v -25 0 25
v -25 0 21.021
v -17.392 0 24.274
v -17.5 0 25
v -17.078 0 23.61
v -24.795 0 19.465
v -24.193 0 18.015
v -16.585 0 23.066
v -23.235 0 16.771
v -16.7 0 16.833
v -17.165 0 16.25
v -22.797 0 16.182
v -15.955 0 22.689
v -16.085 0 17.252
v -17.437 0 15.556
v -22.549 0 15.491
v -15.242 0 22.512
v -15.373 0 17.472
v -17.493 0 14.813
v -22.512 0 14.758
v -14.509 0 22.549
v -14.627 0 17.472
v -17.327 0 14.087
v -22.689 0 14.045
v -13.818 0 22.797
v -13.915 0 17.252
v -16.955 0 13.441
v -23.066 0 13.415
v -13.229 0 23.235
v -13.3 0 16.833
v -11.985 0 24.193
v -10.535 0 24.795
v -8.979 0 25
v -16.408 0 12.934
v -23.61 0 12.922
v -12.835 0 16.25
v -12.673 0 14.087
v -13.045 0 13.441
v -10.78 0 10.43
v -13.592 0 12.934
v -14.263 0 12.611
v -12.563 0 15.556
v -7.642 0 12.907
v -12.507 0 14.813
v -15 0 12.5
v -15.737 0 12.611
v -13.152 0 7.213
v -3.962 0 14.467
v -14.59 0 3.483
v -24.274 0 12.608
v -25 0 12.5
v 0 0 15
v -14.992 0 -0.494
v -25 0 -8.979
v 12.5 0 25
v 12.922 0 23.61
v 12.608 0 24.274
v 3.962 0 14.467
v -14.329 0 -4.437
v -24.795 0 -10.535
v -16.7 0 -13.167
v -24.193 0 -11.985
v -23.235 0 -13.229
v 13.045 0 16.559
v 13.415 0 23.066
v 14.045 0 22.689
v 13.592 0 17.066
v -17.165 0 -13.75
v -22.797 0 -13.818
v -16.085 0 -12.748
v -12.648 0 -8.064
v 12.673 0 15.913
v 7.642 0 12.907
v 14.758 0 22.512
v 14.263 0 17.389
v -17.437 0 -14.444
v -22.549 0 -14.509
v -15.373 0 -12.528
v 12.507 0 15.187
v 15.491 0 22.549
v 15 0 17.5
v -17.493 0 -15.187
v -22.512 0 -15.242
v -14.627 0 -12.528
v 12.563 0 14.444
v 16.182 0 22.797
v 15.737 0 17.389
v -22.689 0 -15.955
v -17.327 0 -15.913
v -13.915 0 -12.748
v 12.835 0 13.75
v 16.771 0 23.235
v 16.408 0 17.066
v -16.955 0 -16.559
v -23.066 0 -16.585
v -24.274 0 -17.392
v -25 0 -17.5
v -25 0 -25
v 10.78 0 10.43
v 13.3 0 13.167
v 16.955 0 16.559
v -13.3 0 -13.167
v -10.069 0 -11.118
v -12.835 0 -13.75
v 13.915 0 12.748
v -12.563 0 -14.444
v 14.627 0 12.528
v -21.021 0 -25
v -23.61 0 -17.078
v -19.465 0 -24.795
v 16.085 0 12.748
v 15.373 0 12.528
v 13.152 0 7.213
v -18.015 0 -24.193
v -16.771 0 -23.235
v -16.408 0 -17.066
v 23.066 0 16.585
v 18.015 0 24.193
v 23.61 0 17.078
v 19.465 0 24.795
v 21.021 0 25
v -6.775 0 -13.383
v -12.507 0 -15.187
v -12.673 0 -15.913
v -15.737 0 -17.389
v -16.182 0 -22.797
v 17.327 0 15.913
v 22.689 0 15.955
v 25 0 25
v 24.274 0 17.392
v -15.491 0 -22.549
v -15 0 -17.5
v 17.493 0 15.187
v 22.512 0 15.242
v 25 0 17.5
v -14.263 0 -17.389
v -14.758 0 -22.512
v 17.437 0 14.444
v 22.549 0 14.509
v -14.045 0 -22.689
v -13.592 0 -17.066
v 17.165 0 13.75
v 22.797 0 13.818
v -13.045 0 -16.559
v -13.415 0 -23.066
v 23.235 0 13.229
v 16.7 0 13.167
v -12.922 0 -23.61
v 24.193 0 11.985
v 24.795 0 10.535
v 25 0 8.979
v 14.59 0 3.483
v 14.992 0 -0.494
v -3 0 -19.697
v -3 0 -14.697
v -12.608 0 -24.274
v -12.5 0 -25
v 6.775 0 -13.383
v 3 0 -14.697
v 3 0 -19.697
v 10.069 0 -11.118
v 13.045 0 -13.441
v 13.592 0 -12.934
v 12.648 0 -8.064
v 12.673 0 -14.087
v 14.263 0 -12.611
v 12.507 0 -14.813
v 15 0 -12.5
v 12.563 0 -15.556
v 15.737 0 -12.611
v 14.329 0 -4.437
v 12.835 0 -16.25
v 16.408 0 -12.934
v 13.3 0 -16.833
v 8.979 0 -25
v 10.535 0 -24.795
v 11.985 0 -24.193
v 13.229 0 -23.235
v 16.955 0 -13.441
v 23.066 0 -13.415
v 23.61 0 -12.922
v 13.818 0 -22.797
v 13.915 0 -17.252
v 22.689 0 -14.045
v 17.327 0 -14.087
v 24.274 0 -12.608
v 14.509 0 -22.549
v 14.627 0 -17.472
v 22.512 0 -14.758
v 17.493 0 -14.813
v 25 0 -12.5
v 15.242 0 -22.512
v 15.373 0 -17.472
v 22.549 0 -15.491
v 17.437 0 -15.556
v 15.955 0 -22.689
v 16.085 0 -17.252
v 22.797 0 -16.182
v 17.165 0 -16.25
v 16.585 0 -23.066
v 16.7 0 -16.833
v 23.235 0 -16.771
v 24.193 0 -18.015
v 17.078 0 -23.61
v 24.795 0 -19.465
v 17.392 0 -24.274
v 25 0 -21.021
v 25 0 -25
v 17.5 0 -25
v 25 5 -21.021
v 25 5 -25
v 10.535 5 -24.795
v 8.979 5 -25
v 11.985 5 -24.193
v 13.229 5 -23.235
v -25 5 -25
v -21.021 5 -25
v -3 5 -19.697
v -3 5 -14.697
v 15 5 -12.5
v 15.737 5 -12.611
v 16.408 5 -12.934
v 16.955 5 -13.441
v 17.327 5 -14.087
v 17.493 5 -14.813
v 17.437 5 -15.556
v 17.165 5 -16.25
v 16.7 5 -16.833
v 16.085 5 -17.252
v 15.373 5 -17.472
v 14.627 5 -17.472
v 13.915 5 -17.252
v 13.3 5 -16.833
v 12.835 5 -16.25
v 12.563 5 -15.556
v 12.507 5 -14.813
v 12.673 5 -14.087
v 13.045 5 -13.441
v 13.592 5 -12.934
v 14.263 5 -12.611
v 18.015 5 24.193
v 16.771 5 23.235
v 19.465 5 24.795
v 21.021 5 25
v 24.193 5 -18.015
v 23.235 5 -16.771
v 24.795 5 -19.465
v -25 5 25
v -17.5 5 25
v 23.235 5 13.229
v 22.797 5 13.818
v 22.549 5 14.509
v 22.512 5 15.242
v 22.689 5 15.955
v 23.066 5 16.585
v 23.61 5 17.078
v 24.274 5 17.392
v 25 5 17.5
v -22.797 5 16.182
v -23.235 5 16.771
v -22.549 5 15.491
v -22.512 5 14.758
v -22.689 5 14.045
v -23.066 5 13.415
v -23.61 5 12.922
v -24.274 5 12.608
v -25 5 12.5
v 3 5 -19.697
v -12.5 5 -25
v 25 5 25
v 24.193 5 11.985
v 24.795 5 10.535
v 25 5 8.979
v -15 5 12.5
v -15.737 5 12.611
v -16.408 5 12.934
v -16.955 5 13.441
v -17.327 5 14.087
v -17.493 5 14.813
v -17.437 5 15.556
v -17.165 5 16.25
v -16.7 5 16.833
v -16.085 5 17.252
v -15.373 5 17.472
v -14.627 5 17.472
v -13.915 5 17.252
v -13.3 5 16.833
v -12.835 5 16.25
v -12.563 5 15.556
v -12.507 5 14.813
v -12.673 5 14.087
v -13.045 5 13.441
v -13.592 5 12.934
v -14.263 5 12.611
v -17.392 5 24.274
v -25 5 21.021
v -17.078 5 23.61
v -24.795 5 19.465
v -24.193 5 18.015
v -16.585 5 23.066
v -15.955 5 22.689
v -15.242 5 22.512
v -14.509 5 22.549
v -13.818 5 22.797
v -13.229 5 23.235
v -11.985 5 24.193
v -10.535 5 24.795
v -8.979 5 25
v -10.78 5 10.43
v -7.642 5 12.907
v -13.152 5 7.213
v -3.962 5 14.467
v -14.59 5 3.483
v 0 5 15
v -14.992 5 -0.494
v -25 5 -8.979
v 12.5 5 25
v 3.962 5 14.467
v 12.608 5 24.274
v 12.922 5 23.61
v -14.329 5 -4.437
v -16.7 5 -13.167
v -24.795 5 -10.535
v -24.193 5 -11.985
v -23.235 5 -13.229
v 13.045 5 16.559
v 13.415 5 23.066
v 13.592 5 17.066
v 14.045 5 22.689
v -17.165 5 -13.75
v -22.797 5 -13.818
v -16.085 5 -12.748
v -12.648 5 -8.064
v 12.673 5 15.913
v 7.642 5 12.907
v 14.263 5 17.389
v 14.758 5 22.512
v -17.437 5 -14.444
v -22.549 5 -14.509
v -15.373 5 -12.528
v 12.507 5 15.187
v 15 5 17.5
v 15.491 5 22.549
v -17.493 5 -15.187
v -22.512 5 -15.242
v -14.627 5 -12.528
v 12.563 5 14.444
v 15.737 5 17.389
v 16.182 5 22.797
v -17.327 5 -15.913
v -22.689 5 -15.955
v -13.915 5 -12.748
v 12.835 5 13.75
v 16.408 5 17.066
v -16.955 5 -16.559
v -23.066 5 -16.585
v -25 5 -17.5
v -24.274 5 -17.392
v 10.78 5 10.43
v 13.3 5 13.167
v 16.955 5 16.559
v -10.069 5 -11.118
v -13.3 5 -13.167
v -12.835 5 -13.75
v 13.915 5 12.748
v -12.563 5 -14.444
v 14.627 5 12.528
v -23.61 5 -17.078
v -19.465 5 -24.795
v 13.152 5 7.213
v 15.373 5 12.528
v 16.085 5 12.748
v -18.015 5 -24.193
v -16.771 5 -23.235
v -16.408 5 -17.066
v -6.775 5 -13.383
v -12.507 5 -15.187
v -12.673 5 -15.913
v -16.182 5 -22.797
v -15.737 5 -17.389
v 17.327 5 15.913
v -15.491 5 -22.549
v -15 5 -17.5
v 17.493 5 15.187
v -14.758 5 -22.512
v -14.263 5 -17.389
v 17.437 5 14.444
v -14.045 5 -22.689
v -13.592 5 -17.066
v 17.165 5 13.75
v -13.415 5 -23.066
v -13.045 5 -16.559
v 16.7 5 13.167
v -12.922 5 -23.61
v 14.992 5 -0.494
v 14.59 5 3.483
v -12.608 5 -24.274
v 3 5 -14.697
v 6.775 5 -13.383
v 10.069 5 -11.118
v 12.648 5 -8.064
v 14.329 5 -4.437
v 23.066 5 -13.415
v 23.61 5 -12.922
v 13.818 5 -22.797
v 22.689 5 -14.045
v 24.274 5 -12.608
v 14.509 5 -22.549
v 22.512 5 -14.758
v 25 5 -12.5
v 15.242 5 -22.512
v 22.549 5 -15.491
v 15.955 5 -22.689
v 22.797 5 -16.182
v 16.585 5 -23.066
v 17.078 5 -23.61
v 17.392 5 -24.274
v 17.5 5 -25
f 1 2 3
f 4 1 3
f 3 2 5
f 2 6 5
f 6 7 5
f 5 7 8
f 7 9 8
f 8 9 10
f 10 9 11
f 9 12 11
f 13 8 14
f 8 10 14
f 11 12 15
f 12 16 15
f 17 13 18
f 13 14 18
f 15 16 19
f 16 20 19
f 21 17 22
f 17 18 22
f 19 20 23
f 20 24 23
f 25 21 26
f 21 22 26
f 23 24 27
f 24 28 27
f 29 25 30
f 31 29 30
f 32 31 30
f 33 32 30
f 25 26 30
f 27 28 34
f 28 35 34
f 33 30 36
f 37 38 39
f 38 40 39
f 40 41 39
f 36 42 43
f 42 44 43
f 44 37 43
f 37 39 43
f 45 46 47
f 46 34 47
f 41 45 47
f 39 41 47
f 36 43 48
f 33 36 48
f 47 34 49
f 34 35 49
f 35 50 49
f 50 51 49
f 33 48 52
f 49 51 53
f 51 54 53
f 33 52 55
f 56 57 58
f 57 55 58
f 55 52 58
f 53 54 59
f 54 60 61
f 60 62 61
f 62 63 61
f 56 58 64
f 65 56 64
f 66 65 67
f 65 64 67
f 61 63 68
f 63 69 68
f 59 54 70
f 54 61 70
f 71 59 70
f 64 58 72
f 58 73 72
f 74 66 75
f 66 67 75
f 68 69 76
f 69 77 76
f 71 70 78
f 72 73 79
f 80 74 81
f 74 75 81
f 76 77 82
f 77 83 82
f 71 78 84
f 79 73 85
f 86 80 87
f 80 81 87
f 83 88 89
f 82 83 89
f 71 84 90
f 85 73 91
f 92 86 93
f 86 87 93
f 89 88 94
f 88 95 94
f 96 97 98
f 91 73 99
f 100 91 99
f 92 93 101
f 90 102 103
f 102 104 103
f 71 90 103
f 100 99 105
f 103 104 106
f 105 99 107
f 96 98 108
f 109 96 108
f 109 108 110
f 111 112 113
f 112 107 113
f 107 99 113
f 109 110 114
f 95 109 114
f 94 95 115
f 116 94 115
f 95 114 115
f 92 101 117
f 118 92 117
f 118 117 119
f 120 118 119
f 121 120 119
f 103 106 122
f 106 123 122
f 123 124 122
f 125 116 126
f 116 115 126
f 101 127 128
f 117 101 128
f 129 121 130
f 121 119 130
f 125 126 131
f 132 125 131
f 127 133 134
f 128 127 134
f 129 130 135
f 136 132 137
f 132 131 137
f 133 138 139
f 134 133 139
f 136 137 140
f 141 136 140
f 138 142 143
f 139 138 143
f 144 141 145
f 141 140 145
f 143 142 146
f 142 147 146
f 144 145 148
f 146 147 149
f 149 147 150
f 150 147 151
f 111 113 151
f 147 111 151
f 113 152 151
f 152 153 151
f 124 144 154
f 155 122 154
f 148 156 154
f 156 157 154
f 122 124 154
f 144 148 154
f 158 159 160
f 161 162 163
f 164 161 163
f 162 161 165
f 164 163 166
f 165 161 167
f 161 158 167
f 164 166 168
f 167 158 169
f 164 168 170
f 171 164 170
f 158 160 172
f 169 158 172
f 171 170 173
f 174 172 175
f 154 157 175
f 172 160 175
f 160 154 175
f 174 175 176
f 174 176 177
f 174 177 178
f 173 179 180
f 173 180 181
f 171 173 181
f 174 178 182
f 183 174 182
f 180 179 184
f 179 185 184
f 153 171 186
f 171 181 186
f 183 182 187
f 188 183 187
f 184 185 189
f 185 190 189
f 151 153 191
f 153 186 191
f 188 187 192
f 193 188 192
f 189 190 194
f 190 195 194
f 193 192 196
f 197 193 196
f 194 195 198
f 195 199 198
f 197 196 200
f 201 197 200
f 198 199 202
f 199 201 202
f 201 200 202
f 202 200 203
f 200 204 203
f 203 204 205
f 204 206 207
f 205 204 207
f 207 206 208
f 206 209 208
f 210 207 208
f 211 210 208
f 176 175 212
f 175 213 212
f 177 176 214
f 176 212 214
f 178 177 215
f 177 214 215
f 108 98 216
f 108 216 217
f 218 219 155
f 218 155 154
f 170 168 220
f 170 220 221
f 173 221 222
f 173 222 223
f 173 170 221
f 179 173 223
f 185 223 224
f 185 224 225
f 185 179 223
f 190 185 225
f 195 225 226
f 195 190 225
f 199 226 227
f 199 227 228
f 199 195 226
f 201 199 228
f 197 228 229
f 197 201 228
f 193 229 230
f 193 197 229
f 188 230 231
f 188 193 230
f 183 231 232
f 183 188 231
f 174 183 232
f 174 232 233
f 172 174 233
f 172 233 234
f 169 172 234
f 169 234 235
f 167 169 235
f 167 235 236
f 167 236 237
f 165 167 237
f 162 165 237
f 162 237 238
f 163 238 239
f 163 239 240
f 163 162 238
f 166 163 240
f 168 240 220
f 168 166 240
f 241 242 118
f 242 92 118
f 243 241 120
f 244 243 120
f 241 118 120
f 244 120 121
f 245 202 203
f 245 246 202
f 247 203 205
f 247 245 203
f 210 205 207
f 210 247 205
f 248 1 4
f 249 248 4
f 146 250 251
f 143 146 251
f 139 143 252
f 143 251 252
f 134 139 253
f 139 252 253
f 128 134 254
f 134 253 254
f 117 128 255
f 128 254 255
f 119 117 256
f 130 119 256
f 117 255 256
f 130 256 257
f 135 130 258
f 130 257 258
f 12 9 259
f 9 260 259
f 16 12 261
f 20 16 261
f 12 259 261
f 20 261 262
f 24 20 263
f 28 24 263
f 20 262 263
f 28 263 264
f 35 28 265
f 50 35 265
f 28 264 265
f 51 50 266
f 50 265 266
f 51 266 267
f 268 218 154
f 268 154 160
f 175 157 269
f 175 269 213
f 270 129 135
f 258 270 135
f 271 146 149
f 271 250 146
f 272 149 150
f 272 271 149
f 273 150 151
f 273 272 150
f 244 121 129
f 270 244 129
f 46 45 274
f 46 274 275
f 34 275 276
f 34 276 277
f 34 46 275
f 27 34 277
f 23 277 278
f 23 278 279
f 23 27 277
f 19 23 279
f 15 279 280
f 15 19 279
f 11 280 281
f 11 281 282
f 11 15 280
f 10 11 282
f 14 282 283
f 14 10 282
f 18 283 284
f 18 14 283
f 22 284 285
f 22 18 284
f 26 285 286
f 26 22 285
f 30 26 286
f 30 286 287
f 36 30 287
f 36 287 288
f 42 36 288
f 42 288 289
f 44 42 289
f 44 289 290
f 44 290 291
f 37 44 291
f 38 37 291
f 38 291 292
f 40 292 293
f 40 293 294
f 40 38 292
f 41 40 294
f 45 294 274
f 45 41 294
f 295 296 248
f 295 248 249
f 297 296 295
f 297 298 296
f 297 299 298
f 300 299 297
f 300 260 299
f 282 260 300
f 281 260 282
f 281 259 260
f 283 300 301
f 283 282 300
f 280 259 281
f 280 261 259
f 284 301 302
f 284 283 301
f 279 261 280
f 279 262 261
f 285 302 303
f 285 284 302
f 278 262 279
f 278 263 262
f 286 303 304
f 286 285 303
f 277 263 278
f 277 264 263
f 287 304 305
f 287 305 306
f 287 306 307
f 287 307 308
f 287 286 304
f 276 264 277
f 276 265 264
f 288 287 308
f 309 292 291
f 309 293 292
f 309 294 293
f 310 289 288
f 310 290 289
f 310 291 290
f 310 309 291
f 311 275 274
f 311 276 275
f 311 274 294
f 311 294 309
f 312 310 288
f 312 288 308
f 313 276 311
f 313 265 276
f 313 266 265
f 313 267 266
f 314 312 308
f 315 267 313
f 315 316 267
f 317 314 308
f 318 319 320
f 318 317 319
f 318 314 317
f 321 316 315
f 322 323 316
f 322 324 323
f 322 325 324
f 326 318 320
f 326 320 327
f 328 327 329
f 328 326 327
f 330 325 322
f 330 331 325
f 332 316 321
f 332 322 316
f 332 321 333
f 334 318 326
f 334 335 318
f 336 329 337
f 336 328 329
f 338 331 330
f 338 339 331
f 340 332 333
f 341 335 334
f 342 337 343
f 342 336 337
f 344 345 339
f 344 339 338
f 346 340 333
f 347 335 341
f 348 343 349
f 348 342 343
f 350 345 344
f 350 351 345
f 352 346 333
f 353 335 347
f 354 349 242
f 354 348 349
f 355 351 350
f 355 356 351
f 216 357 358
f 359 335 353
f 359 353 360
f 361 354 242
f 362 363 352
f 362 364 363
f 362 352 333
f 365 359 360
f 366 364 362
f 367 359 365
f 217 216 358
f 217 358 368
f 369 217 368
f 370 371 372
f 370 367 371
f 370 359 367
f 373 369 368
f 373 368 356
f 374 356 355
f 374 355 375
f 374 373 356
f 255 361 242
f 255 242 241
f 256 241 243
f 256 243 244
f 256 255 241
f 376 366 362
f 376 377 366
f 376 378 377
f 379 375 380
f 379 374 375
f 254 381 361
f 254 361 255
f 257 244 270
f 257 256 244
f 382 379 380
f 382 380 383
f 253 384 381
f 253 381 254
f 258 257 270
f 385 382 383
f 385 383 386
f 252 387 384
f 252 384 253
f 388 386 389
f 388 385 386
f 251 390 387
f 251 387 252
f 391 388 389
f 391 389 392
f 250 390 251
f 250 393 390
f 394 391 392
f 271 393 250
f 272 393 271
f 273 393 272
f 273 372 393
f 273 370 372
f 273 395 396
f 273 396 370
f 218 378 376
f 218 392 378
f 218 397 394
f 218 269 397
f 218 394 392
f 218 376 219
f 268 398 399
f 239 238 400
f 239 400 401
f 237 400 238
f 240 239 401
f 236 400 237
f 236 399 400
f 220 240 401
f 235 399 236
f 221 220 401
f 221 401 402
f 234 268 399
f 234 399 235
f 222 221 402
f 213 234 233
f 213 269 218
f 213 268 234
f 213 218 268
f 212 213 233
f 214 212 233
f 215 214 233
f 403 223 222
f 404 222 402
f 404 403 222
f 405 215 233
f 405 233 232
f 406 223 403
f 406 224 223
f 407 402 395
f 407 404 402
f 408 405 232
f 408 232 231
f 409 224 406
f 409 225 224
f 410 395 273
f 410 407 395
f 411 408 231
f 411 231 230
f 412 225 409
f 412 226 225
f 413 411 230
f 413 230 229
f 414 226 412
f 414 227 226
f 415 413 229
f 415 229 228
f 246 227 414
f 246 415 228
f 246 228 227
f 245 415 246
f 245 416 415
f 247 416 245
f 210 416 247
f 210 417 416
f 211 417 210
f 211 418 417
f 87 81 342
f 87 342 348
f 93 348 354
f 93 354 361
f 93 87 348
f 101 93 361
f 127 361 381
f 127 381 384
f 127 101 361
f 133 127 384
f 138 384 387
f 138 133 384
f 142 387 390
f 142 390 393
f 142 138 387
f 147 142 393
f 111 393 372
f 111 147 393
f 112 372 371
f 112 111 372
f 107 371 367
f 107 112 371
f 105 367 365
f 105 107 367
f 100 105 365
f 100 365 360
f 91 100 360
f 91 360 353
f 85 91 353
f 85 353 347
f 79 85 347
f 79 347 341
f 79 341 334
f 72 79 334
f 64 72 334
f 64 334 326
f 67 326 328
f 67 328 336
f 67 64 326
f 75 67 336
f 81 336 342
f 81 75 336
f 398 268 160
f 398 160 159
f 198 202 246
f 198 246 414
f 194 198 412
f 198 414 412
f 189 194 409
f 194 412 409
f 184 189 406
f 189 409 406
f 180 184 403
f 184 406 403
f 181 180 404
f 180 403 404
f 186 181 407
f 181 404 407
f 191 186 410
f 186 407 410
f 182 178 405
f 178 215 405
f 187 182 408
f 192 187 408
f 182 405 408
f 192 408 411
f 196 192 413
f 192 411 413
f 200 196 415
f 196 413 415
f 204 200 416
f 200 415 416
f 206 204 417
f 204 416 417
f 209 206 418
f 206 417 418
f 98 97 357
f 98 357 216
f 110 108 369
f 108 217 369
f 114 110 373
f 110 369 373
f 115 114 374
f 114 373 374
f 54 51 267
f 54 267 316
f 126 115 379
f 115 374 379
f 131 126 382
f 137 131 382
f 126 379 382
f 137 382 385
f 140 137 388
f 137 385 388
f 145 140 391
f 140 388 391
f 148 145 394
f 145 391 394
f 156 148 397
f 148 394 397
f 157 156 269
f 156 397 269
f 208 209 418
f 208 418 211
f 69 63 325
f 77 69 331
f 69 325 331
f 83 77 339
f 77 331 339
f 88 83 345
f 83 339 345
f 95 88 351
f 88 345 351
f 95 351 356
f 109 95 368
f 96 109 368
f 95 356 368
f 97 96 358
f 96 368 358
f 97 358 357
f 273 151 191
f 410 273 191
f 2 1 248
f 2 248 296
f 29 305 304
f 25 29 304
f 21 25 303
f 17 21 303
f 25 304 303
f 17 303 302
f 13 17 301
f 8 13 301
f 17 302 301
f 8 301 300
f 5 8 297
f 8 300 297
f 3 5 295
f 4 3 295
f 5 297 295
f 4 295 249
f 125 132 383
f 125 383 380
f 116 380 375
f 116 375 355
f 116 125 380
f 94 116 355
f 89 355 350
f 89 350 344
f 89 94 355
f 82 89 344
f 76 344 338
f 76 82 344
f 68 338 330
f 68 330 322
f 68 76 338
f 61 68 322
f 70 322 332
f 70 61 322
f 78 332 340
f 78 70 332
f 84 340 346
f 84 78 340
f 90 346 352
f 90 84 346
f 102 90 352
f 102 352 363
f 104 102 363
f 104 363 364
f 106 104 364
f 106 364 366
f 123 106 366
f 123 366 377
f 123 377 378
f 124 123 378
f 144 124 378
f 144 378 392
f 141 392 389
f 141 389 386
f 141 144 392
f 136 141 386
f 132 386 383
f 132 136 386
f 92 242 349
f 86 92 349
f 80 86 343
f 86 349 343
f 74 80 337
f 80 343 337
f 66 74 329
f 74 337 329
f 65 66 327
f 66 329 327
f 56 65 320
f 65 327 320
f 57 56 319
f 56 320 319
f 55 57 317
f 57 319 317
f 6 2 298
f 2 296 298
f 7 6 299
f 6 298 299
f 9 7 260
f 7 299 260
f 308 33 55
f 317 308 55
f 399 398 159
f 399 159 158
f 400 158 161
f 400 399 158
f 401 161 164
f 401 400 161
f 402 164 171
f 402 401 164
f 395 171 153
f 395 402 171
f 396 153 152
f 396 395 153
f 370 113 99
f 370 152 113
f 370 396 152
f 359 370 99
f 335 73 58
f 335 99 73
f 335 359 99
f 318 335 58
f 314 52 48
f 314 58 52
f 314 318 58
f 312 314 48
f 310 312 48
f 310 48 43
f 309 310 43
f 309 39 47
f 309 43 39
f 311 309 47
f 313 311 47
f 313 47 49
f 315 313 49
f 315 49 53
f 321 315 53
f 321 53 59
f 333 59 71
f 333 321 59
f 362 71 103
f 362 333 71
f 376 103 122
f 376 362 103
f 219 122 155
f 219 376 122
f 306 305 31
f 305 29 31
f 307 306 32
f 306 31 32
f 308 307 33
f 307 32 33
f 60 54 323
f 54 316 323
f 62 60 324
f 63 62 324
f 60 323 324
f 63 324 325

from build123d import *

# Parameters (mm, degrees)
SKETCH1_W           = 50
SKETCH1_H           = 50
SKETCH1_R           = 2.5
BOSS_EXTRUDE1_DEPTH = 5
SKETCH2_R           = 2.5
CUT_EXTRUDE1_DEPTH  = 5
CUT_EXTRUDE2_DEPTH  = 36.707142143
FILLET1_R           = 6


with BuildPart() as part:
    # Sketch1 → Boss-Extrude1 (new body)
    with BuildSketch(Plane(origin=(0, 0, 0), x_dir=(1, 0, 0), z_dir=(0, 1, 0))):
        Rectangle(SKETCH1_W, SKETCH1_H)
        with Locations(Location((15, 15, 0), (0, 0, 270))):
            Circle(SKETCH1_R, mode=Mode.SUBTRACT)
        with Locations(Location((15, -15, 0), (0, 0, 270))):
            Circle(SKETCH1_R, mode=Mode.SUBTRACT)
        with Locations(Location((-15, -15, 0), (0, 0, 90))):
            Circle(SKETCH1_R, mode=Mode.SUBTRACT)
        with Locations(Location((-15, 15, 0), (0, 0, 90))):
            Circle(SKETCH1_R, mode=Mode.SUBTRACT)
    extrude(amount=BOSS_EXTRUDE1_DEPTH)

    # Sketch2 → Cut-Extrude1 (cut)
    with BuildSketch(Plane(origin=(0, 5, 0), x_dir=(1, 0, 0), z_dir=(0, 1, 0))):
        with Locations((25, 15)):
            Circle(SKETCH2_R)
        with Locations((25, -15)):
            Circle(SKETCH2_R)
        with Locations((-25, 15)):
            Circle(SKETCH2_R)
        with Locations((-25, -15)):
            Circle(SKETCH2_R)
        with Locations((-15, 25)):
            Circle(SKETCH2_R)
        with Locations((15, 25)):
            Circle(SKETCH2_R)
        with Locations((15, -25)):
            Circle(SKETCH2_R)
        with Locations((-15, -25)):
            Circle(SKETCH2_R)
    extrude(amount=-CUT_EXTRUDE1_DEPTH, mode=Mode.SUBTRACT)

    # Sketch3 → Cut-Extrude2 (cut, through all)
    with BuildSketch(Plane(origin=(0, 5, 0), x_dir=(1, 0, 0), z_dir=(0, 1, 0))):
        with BuildLine():
            Line((-3, 19.696938457), (3, 19.696938457))
            Line((3, 19.696938457), (3, 14.696938457))
            ThreePointArc((3, 14.696938457), (0, -15), (-3, 14.696938457))
            Line((-3, 14.696938457), (-3, 19.696938457))
        make_face()
    extrude(amount=-CUT_EXTRUDE2_DEPTH, mode=Mode.SUBTRACT)

    # Fillet1
    fillet1_edges = [part.edges().sort_by_distance(p)[0] for p in [
        (-12.5, 2.5, 25),
        (17.5, 2.5, 25),
        (-25, 2.5, -12.5),
        (-25, 2.5, 17.5),
        (12.5, 2.5, -25),
        (-17.5, 2.5, -25),
        (25, 2.5, -17.5),
        (25, 2.5, 12.5),
    ]]
    fillet(fillet1_edges, radius=FILLET1_R)


solid = part.part
